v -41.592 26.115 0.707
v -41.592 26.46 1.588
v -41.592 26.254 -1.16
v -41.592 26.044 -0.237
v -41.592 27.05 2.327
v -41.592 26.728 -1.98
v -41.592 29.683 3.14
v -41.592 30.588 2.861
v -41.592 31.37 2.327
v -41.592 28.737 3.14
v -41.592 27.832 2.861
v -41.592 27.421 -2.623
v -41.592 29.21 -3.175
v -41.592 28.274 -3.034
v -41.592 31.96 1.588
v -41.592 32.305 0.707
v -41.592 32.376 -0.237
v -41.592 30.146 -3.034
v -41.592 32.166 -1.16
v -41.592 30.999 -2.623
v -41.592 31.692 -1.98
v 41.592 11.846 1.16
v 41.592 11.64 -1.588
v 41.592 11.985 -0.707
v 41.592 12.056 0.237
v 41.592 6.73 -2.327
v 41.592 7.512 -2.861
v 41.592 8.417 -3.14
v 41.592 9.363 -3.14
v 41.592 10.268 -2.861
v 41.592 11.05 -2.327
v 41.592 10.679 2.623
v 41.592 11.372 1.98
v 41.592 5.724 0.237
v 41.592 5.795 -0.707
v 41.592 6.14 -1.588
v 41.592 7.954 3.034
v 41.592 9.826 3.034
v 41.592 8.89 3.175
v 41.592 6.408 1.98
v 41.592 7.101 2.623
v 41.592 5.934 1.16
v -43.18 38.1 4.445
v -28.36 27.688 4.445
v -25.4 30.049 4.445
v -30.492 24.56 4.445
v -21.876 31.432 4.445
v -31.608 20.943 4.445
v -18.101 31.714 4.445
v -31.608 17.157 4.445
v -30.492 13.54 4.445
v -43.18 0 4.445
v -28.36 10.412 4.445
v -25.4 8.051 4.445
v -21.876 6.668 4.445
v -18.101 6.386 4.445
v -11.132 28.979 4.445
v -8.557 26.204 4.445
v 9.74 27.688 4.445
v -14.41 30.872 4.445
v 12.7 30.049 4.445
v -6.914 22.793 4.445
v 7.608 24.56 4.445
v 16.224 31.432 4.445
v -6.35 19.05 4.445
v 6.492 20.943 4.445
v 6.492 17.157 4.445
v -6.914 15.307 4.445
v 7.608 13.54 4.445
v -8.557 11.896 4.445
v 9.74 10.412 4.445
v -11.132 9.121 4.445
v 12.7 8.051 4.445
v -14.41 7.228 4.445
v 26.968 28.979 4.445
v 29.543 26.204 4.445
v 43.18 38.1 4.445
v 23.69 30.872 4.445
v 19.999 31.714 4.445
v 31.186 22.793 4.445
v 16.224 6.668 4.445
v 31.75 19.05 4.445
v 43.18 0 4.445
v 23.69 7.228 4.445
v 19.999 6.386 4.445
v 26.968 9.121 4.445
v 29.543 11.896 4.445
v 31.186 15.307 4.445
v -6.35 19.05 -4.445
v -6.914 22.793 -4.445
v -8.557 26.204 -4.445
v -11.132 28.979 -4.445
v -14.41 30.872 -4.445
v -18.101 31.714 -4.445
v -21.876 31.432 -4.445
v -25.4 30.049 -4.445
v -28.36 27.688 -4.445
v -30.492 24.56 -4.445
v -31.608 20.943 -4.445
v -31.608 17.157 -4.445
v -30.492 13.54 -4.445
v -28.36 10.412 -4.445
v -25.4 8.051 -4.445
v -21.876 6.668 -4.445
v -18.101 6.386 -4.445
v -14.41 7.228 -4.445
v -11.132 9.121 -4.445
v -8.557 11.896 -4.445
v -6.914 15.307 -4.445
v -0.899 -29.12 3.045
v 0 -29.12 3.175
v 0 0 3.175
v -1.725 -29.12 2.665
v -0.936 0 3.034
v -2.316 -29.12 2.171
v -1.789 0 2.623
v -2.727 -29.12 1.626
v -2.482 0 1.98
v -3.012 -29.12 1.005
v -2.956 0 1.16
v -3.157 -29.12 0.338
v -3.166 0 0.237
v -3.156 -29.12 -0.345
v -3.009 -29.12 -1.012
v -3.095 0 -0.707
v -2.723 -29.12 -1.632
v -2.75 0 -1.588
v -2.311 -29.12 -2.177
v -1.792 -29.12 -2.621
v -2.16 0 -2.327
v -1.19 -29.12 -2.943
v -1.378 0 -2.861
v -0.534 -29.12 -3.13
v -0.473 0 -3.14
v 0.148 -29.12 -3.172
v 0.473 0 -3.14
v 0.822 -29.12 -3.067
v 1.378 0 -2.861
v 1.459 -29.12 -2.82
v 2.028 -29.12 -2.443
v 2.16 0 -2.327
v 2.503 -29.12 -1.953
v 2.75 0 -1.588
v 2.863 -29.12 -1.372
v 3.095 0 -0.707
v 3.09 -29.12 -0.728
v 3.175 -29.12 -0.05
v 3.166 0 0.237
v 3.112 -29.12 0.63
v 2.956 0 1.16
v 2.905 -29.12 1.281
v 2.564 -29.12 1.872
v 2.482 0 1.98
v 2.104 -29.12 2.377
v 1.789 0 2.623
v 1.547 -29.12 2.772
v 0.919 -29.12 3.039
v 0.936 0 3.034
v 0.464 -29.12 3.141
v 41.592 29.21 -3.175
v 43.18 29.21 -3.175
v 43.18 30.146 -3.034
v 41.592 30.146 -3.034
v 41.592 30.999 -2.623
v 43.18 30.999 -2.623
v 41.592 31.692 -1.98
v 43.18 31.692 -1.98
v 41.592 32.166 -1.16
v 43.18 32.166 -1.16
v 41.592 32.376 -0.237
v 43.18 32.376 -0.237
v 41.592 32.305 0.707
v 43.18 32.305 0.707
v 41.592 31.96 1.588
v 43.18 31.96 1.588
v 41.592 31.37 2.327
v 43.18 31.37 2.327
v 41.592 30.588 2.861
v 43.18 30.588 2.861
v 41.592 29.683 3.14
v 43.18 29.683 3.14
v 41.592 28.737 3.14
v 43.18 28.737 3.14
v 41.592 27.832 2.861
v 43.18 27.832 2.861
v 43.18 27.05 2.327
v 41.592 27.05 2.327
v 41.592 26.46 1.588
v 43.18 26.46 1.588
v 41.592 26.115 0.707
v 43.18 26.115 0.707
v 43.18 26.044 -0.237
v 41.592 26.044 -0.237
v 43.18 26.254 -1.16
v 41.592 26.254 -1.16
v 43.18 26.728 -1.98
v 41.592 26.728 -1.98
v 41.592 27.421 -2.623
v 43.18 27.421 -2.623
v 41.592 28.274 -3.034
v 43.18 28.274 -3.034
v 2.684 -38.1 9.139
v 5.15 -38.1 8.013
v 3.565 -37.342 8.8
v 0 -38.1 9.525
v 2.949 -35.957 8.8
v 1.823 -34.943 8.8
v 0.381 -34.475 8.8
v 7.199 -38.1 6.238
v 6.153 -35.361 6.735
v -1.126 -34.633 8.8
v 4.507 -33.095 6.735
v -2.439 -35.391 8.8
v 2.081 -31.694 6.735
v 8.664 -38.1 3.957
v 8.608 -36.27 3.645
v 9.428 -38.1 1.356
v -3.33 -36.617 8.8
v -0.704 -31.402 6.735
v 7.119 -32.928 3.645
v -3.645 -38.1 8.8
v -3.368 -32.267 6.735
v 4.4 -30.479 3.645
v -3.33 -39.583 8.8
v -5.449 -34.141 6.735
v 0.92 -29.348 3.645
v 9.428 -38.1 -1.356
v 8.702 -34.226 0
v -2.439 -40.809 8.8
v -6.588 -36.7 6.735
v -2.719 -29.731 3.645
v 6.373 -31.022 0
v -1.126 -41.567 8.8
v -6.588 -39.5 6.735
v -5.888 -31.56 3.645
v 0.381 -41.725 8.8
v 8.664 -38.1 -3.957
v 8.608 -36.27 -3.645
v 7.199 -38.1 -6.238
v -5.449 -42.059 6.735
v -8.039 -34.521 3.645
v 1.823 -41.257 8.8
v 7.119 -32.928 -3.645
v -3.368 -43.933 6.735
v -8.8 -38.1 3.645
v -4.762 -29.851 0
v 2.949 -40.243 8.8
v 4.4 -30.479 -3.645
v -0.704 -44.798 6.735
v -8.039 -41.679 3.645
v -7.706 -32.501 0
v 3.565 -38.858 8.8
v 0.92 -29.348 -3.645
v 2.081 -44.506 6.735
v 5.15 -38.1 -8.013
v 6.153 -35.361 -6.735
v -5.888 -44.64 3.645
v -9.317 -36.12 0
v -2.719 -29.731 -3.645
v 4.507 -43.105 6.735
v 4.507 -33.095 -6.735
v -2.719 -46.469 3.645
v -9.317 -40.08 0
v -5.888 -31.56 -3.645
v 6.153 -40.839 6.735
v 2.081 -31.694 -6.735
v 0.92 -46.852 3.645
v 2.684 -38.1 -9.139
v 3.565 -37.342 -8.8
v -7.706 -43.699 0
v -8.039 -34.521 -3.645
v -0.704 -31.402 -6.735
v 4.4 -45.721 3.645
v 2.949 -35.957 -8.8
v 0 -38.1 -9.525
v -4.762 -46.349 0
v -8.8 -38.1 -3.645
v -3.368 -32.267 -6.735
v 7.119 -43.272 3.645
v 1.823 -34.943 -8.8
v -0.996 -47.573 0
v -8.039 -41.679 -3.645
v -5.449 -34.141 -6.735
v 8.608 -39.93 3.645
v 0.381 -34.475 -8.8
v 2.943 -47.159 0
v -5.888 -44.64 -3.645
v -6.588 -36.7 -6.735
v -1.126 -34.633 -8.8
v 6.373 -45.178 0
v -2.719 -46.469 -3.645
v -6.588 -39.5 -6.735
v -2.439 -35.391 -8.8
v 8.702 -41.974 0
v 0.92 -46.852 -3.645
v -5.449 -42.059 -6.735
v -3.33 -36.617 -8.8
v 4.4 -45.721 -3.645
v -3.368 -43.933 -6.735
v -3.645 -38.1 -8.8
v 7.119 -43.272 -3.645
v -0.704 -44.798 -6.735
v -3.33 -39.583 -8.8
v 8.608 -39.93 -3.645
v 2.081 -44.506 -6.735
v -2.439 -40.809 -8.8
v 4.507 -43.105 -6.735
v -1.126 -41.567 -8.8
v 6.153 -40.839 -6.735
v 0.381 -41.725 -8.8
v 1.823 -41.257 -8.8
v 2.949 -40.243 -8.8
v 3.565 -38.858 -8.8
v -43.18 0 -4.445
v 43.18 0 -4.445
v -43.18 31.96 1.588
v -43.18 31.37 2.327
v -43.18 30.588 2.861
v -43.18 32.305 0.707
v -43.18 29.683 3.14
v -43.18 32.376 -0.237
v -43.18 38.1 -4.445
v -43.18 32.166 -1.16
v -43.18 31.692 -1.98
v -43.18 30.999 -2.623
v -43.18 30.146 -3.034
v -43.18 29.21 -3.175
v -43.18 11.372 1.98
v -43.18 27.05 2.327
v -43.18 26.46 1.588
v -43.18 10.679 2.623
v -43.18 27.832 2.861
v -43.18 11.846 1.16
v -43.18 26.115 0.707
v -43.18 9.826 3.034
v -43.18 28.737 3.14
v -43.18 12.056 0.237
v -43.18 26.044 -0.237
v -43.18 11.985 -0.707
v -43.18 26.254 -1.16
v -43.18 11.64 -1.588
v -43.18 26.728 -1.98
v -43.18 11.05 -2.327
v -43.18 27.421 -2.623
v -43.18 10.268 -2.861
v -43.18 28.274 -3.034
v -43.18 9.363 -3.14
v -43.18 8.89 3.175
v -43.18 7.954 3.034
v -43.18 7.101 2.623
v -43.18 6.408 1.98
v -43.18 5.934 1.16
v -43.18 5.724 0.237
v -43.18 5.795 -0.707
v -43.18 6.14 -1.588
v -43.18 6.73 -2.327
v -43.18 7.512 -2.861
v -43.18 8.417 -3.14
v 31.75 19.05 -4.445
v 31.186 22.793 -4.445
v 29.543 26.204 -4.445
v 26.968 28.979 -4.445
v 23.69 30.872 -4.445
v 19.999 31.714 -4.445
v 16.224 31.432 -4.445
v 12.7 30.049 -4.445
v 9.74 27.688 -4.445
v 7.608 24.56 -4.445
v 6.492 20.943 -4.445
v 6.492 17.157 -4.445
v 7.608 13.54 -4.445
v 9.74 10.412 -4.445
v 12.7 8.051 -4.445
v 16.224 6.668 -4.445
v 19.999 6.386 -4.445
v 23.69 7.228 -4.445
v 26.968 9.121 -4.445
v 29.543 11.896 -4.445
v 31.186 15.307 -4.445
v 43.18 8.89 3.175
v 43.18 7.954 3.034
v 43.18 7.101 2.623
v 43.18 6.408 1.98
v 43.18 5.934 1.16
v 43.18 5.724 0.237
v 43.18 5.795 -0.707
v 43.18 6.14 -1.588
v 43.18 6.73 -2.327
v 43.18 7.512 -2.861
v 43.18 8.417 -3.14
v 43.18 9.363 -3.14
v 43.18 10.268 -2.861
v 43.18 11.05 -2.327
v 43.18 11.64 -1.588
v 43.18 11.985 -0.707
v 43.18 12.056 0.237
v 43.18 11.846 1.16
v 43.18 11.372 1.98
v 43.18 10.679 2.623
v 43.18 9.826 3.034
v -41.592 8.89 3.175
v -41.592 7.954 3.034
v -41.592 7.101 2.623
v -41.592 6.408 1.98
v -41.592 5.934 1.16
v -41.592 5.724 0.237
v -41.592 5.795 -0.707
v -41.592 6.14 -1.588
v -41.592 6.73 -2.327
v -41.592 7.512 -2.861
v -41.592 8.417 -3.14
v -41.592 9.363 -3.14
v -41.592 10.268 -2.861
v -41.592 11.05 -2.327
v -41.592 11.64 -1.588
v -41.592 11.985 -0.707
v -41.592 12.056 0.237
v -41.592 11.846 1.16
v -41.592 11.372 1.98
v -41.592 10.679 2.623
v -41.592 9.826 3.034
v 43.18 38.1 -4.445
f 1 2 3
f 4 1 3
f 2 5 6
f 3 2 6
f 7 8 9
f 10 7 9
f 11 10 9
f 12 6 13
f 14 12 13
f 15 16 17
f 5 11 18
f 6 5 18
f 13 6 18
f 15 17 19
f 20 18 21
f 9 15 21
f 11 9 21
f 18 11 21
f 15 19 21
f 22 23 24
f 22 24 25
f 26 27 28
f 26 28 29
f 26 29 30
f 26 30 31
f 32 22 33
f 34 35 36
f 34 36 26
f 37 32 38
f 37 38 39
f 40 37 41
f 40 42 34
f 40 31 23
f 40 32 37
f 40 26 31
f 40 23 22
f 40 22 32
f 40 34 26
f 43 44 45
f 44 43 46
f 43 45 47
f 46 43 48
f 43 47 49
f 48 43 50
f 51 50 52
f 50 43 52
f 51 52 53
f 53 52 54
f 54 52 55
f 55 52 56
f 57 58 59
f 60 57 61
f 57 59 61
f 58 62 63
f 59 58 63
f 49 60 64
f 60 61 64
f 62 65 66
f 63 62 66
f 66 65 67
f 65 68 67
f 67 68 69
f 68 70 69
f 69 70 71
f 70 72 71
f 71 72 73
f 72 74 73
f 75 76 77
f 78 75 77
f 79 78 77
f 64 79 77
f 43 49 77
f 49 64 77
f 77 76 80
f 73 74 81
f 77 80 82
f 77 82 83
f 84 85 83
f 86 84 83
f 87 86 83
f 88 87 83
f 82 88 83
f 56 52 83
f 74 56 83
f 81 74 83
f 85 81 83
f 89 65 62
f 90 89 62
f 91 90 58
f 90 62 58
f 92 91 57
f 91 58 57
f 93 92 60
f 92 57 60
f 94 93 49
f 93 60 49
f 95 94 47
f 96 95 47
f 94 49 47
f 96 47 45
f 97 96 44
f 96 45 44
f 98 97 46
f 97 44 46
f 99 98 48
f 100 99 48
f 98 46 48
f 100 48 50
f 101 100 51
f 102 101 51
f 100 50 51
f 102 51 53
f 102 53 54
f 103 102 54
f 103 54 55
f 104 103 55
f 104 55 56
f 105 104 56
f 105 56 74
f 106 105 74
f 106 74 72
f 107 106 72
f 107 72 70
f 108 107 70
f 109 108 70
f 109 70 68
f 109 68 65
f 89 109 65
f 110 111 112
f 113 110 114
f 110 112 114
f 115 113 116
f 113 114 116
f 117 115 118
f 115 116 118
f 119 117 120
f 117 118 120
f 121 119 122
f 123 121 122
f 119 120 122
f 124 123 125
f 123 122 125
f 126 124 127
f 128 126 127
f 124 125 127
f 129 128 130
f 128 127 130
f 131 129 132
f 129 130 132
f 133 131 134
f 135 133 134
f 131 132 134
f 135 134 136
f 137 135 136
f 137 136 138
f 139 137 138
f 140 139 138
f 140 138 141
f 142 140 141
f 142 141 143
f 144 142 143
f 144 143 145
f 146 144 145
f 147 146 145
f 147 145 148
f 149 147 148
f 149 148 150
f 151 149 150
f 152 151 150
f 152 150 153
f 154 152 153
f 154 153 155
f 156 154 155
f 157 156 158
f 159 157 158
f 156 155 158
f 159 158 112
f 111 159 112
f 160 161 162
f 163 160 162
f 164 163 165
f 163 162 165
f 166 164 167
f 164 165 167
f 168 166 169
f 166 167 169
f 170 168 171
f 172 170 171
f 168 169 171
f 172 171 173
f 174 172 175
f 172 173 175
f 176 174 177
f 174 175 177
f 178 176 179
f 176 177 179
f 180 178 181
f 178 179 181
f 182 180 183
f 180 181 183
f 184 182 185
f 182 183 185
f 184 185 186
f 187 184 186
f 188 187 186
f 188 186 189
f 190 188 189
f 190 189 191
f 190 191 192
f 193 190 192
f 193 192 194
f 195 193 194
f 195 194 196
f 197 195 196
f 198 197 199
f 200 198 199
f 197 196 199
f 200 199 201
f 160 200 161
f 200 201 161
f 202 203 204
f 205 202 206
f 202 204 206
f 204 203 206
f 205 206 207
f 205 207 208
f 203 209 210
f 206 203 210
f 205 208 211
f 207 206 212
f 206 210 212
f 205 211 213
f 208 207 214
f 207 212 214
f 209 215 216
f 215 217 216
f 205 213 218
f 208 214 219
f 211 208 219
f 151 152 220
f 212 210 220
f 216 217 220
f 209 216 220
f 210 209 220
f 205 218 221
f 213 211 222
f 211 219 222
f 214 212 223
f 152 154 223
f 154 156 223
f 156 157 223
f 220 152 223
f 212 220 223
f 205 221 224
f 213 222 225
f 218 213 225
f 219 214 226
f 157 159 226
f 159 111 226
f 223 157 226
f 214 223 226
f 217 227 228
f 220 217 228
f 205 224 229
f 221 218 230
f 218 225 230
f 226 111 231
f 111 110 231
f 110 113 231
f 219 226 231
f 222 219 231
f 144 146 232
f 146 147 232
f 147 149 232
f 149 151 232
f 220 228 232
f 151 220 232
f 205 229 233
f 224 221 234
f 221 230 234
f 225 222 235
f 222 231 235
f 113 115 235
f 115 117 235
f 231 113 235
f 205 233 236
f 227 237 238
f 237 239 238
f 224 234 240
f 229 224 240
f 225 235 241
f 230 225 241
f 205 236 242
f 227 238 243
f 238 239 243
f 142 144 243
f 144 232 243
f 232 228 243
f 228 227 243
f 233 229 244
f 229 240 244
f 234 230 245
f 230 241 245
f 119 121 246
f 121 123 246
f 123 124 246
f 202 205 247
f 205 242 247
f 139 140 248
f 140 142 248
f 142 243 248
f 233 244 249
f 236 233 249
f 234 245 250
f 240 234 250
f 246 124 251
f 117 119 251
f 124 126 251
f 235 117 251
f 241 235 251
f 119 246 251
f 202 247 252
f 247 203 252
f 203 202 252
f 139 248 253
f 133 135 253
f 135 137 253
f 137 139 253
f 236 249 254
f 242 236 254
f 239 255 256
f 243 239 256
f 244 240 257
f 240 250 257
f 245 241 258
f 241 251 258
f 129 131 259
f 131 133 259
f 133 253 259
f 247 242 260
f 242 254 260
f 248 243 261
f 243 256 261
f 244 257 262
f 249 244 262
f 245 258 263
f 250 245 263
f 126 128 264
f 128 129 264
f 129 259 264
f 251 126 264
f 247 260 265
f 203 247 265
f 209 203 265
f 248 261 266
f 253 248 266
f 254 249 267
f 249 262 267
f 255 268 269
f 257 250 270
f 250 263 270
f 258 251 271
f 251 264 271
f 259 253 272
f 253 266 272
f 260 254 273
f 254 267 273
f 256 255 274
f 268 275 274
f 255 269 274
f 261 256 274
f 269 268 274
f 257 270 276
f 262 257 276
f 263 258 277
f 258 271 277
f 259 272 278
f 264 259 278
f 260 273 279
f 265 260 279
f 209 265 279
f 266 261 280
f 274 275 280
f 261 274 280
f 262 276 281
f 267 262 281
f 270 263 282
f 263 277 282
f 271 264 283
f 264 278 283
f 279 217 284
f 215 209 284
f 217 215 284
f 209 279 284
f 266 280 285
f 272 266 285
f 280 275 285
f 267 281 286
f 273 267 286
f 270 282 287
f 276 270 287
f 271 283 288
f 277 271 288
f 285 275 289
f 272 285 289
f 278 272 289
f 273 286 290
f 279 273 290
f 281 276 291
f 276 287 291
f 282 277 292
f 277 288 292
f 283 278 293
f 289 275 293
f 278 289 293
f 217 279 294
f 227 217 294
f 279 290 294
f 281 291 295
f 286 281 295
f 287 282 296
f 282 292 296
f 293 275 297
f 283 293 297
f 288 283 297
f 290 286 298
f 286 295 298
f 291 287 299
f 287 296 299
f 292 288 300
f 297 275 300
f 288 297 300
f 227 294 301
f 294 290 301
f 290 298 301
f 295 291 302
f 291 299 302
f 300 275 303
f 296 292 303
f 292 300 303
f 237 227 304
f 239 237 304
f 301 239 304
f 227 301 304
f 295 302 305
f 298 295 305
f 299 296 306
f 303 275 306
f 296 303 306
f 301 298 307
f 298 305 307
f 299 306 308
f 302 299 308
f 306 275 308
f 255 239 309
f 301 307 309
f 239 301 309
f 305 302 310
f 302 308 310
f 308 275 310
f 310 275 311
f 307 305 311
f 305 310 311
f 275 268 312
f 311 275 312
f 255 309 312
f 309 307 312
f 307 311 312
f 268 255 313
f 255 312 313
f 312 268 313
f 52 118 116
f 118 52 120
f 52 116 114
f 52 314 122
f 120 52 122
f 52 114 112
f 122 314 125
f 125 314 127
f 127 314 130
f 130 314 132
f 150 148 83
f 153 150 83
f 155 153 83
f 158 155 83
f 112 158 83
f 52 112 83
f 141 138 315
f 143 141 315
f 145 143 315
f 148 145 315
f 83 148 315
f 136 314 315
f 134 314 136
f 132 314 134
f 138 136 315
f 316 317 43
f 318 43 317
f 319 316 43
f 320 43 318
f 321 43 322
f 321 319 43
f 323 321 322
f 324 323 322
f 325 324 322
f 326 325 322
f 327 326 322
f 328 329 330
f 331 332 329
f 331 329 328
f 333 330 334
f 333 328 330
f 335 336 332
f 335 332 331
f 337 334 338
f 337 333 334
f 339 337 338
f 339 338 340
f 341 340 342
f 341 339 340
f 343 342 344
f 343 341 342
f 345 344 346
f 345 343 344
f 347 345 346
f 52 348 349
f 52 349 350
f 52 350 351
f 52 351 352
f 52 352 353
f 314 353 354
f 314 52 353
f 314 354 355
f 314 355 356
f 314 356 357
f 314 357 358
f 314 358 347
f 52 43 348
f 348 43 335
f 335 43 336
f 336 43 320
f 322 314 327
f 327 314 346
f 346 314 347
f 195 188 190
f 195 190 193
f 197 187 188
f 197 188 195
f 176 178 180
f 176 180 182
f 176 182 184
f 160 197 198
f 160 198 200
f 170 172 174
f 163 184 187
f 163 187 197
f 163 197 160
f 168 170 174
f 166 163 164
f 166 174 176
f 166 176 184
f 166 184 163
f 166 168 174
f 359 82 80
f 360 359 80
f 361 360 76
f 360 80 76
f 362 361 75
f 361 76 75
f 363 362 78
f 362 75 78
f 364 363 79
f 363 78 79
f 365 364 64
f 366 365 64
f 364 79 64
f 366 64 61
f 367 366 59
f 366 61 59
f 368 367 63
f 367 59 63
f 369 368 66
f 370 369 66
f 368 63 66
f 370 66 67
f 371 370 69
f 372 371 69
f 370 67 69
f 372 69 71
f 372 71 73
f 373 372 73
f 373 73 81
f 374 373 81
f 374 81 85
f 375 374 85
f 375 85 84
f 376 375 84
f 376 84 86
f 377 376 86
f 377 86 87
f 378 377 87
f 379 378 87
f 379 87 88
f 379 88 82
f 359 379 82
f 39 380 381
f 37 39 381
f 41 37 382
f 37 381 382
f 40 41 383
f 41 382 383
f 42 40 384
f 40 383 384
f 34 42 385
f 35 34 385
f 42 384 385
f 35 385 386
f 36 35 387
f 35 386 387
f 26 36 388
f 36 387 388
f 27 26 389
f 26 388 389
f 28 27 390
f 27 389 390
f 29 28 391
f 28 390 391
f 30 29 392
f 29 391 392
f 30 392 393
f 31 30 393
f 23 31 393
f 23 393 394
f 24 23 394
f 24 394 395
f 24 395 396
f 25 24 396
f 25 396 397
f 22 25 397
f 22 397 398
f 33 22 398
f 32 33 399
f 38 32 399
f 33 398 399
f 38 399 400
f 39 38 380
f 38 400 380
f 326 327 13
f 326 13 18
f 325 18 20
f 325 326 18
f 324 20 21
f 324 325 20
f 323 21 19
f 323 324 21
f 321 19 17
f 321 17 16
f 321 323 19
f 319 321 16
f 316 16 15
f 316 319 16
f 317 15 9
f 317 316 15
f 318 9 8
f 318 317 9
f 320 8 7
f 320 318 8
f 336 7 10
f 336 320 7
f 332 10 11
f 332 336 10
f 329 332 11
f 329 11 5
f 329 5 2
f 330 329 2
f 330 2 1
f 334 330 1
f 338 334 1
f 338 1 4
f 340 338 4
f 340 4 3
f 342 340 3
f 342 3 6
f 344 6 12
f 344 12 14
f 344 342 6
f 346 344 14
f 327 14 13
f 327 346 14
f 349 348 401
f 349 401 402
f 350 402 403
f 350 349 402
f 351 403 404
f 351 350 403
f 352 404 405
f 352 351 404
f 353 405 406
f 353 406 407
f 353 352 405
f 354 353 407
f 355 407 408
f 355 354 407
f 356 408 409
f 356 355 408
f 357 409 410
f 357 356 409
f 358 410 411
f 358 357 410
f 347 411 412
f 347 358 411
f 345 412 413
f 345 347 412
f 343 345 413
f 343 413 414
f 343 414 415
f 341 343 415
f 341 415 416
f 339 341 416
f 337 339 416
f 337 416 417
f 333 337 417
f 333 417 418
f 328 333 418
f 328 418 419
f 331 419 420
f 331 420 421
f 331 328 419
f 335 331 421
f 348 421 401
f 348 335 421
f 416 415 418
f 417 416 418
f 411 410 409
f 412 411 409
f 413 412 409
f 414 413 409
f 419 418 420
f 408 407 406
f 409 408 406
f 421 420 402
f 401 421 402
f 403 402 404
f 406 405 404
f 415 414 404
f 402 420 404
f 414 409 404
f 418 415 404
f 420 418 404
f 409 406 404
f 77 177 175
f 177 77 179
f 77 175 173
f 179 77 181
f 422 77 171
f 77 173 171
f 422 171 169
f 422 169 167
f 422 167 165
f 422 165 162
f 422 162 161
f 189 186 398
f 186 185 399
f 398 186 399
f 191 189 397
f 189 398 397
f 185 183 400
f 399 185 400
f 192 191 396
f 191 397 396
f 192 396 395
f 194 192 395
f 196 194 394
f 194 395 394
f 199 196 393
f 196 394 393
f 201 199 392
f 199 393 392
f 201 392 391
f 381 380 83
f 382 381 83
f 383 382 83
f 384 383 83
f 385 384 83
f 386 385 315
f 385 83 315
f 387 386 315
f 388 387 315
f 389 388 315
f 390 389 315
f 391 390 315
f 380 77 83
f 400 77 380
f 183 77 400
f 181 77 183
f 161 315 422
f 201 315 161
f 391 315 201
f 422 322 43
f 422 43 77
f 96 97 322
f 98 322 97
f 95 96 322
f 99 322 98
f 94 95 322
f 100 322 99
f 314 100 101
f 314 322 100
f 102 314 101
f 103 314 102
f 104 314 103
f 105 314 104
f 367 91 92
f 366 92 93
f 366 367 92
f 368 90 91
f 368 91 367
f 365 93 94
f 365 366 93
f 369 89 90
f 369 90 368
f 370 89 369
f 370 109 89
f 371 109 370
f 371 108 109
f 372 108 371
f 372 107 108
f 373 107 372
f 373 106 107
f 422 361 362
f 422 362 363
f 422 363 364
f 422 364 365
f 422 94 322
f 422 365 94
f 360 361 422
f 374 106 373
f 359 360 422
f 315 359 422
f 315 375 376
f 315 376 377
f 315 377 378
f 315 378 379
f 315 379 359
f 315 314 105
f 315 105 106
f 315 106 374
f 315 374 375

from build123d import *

# Parameters (mm, degrees)
SKETCH1_W           = 86.36
SKETCH1_H           = 8.89
BOSS_EXTRUDE1_DEPTH = 38.1
SKETCH2_R           = 12.7
CUT_EXTRUDE1_DEPTH  = 59.267954315
SKETCH3_R           = 3.175
BOSS_EXTRUDE2_DEPTH = 38.1
SKETCH5_R           = 3.175
CUT_EXTRUDE2_DEPTH  = 1.5875


with BuildPart() as part:
    # Sketch1 → Boss-Extrude1 (new body)
    with BuildSketch(Plane(origin=(0, 0, 0), x_dir=(1, 0, 0), z_dir=(0, 1, 0))):
        Rectangle(SKETCH1_W, SKETCH1_H)
    extrude(amount=BOSS_EXTRUDE1_DEPTH)

    # Sketch2 → Cut-Extrude1 (cut, through all)
    with BuildSketch(Plane.XY.offset(4.445)):
        with Locations((19.05, 19.05)):
            Circle(SKETCH2_R)
        with Locations((-19.05, 19.05)):
            Circle(SKETCH2_R)
    extrude(amount=-CUT_EXTRUDE1_DEPTH, mode=Mode.SUBTRACT)

    # Sketch3 → Boss-Extrude2 (add)
    with BuildSketch(Plane.XZ):
        with Locations(Location((0, 0, 0), (0, 0, 90))):
            Circle(SKETCH3_R)
    extrude(amount=BOSS_EXTRUDE2_DEPTH)

    # Sketch4 → Revolve1 (revolve)
    with BuildSketch(Plane.XZ.offset(38.1)):
        with BuildLine():
            Line((0, -9.525), (0, 9.525))
            ThreePointArc((0, 9.525), (9.525, 0), (0, -9.525))
        make_face()
    revolve(axis=Axis((0, -38.1, -9.525), (0, 0, 1)))

    # Sketch5 → Cut-Extrude2 (cut)
    with BuildSketch(Plane(origin=(43.18, 0, 0), x_dir=(0, 0, -1), z_dir=(1, 0, 0))):
        with Locations((0, 29.21)):
            Circle(SKETCH5_R)
        with Locations(Location((0, 8.89, 0), (0, 0, 180))):
            Circle(SKETCH5_R)
    cut_extrude2 = extrude(amount=-CUT_EXTRUDE2_DEPTH, mode=Mode.SUBTRACT)

    # Mirror1: Cut-Extrude2 across plane
    add(cut_extrude2.mirror(Plane(origin=(0, 0, 0), x_dir=(0, 0, 1), z_dir=(1, 0, 0))), mode=Mode.SUBTRACT)


solid = part.part
